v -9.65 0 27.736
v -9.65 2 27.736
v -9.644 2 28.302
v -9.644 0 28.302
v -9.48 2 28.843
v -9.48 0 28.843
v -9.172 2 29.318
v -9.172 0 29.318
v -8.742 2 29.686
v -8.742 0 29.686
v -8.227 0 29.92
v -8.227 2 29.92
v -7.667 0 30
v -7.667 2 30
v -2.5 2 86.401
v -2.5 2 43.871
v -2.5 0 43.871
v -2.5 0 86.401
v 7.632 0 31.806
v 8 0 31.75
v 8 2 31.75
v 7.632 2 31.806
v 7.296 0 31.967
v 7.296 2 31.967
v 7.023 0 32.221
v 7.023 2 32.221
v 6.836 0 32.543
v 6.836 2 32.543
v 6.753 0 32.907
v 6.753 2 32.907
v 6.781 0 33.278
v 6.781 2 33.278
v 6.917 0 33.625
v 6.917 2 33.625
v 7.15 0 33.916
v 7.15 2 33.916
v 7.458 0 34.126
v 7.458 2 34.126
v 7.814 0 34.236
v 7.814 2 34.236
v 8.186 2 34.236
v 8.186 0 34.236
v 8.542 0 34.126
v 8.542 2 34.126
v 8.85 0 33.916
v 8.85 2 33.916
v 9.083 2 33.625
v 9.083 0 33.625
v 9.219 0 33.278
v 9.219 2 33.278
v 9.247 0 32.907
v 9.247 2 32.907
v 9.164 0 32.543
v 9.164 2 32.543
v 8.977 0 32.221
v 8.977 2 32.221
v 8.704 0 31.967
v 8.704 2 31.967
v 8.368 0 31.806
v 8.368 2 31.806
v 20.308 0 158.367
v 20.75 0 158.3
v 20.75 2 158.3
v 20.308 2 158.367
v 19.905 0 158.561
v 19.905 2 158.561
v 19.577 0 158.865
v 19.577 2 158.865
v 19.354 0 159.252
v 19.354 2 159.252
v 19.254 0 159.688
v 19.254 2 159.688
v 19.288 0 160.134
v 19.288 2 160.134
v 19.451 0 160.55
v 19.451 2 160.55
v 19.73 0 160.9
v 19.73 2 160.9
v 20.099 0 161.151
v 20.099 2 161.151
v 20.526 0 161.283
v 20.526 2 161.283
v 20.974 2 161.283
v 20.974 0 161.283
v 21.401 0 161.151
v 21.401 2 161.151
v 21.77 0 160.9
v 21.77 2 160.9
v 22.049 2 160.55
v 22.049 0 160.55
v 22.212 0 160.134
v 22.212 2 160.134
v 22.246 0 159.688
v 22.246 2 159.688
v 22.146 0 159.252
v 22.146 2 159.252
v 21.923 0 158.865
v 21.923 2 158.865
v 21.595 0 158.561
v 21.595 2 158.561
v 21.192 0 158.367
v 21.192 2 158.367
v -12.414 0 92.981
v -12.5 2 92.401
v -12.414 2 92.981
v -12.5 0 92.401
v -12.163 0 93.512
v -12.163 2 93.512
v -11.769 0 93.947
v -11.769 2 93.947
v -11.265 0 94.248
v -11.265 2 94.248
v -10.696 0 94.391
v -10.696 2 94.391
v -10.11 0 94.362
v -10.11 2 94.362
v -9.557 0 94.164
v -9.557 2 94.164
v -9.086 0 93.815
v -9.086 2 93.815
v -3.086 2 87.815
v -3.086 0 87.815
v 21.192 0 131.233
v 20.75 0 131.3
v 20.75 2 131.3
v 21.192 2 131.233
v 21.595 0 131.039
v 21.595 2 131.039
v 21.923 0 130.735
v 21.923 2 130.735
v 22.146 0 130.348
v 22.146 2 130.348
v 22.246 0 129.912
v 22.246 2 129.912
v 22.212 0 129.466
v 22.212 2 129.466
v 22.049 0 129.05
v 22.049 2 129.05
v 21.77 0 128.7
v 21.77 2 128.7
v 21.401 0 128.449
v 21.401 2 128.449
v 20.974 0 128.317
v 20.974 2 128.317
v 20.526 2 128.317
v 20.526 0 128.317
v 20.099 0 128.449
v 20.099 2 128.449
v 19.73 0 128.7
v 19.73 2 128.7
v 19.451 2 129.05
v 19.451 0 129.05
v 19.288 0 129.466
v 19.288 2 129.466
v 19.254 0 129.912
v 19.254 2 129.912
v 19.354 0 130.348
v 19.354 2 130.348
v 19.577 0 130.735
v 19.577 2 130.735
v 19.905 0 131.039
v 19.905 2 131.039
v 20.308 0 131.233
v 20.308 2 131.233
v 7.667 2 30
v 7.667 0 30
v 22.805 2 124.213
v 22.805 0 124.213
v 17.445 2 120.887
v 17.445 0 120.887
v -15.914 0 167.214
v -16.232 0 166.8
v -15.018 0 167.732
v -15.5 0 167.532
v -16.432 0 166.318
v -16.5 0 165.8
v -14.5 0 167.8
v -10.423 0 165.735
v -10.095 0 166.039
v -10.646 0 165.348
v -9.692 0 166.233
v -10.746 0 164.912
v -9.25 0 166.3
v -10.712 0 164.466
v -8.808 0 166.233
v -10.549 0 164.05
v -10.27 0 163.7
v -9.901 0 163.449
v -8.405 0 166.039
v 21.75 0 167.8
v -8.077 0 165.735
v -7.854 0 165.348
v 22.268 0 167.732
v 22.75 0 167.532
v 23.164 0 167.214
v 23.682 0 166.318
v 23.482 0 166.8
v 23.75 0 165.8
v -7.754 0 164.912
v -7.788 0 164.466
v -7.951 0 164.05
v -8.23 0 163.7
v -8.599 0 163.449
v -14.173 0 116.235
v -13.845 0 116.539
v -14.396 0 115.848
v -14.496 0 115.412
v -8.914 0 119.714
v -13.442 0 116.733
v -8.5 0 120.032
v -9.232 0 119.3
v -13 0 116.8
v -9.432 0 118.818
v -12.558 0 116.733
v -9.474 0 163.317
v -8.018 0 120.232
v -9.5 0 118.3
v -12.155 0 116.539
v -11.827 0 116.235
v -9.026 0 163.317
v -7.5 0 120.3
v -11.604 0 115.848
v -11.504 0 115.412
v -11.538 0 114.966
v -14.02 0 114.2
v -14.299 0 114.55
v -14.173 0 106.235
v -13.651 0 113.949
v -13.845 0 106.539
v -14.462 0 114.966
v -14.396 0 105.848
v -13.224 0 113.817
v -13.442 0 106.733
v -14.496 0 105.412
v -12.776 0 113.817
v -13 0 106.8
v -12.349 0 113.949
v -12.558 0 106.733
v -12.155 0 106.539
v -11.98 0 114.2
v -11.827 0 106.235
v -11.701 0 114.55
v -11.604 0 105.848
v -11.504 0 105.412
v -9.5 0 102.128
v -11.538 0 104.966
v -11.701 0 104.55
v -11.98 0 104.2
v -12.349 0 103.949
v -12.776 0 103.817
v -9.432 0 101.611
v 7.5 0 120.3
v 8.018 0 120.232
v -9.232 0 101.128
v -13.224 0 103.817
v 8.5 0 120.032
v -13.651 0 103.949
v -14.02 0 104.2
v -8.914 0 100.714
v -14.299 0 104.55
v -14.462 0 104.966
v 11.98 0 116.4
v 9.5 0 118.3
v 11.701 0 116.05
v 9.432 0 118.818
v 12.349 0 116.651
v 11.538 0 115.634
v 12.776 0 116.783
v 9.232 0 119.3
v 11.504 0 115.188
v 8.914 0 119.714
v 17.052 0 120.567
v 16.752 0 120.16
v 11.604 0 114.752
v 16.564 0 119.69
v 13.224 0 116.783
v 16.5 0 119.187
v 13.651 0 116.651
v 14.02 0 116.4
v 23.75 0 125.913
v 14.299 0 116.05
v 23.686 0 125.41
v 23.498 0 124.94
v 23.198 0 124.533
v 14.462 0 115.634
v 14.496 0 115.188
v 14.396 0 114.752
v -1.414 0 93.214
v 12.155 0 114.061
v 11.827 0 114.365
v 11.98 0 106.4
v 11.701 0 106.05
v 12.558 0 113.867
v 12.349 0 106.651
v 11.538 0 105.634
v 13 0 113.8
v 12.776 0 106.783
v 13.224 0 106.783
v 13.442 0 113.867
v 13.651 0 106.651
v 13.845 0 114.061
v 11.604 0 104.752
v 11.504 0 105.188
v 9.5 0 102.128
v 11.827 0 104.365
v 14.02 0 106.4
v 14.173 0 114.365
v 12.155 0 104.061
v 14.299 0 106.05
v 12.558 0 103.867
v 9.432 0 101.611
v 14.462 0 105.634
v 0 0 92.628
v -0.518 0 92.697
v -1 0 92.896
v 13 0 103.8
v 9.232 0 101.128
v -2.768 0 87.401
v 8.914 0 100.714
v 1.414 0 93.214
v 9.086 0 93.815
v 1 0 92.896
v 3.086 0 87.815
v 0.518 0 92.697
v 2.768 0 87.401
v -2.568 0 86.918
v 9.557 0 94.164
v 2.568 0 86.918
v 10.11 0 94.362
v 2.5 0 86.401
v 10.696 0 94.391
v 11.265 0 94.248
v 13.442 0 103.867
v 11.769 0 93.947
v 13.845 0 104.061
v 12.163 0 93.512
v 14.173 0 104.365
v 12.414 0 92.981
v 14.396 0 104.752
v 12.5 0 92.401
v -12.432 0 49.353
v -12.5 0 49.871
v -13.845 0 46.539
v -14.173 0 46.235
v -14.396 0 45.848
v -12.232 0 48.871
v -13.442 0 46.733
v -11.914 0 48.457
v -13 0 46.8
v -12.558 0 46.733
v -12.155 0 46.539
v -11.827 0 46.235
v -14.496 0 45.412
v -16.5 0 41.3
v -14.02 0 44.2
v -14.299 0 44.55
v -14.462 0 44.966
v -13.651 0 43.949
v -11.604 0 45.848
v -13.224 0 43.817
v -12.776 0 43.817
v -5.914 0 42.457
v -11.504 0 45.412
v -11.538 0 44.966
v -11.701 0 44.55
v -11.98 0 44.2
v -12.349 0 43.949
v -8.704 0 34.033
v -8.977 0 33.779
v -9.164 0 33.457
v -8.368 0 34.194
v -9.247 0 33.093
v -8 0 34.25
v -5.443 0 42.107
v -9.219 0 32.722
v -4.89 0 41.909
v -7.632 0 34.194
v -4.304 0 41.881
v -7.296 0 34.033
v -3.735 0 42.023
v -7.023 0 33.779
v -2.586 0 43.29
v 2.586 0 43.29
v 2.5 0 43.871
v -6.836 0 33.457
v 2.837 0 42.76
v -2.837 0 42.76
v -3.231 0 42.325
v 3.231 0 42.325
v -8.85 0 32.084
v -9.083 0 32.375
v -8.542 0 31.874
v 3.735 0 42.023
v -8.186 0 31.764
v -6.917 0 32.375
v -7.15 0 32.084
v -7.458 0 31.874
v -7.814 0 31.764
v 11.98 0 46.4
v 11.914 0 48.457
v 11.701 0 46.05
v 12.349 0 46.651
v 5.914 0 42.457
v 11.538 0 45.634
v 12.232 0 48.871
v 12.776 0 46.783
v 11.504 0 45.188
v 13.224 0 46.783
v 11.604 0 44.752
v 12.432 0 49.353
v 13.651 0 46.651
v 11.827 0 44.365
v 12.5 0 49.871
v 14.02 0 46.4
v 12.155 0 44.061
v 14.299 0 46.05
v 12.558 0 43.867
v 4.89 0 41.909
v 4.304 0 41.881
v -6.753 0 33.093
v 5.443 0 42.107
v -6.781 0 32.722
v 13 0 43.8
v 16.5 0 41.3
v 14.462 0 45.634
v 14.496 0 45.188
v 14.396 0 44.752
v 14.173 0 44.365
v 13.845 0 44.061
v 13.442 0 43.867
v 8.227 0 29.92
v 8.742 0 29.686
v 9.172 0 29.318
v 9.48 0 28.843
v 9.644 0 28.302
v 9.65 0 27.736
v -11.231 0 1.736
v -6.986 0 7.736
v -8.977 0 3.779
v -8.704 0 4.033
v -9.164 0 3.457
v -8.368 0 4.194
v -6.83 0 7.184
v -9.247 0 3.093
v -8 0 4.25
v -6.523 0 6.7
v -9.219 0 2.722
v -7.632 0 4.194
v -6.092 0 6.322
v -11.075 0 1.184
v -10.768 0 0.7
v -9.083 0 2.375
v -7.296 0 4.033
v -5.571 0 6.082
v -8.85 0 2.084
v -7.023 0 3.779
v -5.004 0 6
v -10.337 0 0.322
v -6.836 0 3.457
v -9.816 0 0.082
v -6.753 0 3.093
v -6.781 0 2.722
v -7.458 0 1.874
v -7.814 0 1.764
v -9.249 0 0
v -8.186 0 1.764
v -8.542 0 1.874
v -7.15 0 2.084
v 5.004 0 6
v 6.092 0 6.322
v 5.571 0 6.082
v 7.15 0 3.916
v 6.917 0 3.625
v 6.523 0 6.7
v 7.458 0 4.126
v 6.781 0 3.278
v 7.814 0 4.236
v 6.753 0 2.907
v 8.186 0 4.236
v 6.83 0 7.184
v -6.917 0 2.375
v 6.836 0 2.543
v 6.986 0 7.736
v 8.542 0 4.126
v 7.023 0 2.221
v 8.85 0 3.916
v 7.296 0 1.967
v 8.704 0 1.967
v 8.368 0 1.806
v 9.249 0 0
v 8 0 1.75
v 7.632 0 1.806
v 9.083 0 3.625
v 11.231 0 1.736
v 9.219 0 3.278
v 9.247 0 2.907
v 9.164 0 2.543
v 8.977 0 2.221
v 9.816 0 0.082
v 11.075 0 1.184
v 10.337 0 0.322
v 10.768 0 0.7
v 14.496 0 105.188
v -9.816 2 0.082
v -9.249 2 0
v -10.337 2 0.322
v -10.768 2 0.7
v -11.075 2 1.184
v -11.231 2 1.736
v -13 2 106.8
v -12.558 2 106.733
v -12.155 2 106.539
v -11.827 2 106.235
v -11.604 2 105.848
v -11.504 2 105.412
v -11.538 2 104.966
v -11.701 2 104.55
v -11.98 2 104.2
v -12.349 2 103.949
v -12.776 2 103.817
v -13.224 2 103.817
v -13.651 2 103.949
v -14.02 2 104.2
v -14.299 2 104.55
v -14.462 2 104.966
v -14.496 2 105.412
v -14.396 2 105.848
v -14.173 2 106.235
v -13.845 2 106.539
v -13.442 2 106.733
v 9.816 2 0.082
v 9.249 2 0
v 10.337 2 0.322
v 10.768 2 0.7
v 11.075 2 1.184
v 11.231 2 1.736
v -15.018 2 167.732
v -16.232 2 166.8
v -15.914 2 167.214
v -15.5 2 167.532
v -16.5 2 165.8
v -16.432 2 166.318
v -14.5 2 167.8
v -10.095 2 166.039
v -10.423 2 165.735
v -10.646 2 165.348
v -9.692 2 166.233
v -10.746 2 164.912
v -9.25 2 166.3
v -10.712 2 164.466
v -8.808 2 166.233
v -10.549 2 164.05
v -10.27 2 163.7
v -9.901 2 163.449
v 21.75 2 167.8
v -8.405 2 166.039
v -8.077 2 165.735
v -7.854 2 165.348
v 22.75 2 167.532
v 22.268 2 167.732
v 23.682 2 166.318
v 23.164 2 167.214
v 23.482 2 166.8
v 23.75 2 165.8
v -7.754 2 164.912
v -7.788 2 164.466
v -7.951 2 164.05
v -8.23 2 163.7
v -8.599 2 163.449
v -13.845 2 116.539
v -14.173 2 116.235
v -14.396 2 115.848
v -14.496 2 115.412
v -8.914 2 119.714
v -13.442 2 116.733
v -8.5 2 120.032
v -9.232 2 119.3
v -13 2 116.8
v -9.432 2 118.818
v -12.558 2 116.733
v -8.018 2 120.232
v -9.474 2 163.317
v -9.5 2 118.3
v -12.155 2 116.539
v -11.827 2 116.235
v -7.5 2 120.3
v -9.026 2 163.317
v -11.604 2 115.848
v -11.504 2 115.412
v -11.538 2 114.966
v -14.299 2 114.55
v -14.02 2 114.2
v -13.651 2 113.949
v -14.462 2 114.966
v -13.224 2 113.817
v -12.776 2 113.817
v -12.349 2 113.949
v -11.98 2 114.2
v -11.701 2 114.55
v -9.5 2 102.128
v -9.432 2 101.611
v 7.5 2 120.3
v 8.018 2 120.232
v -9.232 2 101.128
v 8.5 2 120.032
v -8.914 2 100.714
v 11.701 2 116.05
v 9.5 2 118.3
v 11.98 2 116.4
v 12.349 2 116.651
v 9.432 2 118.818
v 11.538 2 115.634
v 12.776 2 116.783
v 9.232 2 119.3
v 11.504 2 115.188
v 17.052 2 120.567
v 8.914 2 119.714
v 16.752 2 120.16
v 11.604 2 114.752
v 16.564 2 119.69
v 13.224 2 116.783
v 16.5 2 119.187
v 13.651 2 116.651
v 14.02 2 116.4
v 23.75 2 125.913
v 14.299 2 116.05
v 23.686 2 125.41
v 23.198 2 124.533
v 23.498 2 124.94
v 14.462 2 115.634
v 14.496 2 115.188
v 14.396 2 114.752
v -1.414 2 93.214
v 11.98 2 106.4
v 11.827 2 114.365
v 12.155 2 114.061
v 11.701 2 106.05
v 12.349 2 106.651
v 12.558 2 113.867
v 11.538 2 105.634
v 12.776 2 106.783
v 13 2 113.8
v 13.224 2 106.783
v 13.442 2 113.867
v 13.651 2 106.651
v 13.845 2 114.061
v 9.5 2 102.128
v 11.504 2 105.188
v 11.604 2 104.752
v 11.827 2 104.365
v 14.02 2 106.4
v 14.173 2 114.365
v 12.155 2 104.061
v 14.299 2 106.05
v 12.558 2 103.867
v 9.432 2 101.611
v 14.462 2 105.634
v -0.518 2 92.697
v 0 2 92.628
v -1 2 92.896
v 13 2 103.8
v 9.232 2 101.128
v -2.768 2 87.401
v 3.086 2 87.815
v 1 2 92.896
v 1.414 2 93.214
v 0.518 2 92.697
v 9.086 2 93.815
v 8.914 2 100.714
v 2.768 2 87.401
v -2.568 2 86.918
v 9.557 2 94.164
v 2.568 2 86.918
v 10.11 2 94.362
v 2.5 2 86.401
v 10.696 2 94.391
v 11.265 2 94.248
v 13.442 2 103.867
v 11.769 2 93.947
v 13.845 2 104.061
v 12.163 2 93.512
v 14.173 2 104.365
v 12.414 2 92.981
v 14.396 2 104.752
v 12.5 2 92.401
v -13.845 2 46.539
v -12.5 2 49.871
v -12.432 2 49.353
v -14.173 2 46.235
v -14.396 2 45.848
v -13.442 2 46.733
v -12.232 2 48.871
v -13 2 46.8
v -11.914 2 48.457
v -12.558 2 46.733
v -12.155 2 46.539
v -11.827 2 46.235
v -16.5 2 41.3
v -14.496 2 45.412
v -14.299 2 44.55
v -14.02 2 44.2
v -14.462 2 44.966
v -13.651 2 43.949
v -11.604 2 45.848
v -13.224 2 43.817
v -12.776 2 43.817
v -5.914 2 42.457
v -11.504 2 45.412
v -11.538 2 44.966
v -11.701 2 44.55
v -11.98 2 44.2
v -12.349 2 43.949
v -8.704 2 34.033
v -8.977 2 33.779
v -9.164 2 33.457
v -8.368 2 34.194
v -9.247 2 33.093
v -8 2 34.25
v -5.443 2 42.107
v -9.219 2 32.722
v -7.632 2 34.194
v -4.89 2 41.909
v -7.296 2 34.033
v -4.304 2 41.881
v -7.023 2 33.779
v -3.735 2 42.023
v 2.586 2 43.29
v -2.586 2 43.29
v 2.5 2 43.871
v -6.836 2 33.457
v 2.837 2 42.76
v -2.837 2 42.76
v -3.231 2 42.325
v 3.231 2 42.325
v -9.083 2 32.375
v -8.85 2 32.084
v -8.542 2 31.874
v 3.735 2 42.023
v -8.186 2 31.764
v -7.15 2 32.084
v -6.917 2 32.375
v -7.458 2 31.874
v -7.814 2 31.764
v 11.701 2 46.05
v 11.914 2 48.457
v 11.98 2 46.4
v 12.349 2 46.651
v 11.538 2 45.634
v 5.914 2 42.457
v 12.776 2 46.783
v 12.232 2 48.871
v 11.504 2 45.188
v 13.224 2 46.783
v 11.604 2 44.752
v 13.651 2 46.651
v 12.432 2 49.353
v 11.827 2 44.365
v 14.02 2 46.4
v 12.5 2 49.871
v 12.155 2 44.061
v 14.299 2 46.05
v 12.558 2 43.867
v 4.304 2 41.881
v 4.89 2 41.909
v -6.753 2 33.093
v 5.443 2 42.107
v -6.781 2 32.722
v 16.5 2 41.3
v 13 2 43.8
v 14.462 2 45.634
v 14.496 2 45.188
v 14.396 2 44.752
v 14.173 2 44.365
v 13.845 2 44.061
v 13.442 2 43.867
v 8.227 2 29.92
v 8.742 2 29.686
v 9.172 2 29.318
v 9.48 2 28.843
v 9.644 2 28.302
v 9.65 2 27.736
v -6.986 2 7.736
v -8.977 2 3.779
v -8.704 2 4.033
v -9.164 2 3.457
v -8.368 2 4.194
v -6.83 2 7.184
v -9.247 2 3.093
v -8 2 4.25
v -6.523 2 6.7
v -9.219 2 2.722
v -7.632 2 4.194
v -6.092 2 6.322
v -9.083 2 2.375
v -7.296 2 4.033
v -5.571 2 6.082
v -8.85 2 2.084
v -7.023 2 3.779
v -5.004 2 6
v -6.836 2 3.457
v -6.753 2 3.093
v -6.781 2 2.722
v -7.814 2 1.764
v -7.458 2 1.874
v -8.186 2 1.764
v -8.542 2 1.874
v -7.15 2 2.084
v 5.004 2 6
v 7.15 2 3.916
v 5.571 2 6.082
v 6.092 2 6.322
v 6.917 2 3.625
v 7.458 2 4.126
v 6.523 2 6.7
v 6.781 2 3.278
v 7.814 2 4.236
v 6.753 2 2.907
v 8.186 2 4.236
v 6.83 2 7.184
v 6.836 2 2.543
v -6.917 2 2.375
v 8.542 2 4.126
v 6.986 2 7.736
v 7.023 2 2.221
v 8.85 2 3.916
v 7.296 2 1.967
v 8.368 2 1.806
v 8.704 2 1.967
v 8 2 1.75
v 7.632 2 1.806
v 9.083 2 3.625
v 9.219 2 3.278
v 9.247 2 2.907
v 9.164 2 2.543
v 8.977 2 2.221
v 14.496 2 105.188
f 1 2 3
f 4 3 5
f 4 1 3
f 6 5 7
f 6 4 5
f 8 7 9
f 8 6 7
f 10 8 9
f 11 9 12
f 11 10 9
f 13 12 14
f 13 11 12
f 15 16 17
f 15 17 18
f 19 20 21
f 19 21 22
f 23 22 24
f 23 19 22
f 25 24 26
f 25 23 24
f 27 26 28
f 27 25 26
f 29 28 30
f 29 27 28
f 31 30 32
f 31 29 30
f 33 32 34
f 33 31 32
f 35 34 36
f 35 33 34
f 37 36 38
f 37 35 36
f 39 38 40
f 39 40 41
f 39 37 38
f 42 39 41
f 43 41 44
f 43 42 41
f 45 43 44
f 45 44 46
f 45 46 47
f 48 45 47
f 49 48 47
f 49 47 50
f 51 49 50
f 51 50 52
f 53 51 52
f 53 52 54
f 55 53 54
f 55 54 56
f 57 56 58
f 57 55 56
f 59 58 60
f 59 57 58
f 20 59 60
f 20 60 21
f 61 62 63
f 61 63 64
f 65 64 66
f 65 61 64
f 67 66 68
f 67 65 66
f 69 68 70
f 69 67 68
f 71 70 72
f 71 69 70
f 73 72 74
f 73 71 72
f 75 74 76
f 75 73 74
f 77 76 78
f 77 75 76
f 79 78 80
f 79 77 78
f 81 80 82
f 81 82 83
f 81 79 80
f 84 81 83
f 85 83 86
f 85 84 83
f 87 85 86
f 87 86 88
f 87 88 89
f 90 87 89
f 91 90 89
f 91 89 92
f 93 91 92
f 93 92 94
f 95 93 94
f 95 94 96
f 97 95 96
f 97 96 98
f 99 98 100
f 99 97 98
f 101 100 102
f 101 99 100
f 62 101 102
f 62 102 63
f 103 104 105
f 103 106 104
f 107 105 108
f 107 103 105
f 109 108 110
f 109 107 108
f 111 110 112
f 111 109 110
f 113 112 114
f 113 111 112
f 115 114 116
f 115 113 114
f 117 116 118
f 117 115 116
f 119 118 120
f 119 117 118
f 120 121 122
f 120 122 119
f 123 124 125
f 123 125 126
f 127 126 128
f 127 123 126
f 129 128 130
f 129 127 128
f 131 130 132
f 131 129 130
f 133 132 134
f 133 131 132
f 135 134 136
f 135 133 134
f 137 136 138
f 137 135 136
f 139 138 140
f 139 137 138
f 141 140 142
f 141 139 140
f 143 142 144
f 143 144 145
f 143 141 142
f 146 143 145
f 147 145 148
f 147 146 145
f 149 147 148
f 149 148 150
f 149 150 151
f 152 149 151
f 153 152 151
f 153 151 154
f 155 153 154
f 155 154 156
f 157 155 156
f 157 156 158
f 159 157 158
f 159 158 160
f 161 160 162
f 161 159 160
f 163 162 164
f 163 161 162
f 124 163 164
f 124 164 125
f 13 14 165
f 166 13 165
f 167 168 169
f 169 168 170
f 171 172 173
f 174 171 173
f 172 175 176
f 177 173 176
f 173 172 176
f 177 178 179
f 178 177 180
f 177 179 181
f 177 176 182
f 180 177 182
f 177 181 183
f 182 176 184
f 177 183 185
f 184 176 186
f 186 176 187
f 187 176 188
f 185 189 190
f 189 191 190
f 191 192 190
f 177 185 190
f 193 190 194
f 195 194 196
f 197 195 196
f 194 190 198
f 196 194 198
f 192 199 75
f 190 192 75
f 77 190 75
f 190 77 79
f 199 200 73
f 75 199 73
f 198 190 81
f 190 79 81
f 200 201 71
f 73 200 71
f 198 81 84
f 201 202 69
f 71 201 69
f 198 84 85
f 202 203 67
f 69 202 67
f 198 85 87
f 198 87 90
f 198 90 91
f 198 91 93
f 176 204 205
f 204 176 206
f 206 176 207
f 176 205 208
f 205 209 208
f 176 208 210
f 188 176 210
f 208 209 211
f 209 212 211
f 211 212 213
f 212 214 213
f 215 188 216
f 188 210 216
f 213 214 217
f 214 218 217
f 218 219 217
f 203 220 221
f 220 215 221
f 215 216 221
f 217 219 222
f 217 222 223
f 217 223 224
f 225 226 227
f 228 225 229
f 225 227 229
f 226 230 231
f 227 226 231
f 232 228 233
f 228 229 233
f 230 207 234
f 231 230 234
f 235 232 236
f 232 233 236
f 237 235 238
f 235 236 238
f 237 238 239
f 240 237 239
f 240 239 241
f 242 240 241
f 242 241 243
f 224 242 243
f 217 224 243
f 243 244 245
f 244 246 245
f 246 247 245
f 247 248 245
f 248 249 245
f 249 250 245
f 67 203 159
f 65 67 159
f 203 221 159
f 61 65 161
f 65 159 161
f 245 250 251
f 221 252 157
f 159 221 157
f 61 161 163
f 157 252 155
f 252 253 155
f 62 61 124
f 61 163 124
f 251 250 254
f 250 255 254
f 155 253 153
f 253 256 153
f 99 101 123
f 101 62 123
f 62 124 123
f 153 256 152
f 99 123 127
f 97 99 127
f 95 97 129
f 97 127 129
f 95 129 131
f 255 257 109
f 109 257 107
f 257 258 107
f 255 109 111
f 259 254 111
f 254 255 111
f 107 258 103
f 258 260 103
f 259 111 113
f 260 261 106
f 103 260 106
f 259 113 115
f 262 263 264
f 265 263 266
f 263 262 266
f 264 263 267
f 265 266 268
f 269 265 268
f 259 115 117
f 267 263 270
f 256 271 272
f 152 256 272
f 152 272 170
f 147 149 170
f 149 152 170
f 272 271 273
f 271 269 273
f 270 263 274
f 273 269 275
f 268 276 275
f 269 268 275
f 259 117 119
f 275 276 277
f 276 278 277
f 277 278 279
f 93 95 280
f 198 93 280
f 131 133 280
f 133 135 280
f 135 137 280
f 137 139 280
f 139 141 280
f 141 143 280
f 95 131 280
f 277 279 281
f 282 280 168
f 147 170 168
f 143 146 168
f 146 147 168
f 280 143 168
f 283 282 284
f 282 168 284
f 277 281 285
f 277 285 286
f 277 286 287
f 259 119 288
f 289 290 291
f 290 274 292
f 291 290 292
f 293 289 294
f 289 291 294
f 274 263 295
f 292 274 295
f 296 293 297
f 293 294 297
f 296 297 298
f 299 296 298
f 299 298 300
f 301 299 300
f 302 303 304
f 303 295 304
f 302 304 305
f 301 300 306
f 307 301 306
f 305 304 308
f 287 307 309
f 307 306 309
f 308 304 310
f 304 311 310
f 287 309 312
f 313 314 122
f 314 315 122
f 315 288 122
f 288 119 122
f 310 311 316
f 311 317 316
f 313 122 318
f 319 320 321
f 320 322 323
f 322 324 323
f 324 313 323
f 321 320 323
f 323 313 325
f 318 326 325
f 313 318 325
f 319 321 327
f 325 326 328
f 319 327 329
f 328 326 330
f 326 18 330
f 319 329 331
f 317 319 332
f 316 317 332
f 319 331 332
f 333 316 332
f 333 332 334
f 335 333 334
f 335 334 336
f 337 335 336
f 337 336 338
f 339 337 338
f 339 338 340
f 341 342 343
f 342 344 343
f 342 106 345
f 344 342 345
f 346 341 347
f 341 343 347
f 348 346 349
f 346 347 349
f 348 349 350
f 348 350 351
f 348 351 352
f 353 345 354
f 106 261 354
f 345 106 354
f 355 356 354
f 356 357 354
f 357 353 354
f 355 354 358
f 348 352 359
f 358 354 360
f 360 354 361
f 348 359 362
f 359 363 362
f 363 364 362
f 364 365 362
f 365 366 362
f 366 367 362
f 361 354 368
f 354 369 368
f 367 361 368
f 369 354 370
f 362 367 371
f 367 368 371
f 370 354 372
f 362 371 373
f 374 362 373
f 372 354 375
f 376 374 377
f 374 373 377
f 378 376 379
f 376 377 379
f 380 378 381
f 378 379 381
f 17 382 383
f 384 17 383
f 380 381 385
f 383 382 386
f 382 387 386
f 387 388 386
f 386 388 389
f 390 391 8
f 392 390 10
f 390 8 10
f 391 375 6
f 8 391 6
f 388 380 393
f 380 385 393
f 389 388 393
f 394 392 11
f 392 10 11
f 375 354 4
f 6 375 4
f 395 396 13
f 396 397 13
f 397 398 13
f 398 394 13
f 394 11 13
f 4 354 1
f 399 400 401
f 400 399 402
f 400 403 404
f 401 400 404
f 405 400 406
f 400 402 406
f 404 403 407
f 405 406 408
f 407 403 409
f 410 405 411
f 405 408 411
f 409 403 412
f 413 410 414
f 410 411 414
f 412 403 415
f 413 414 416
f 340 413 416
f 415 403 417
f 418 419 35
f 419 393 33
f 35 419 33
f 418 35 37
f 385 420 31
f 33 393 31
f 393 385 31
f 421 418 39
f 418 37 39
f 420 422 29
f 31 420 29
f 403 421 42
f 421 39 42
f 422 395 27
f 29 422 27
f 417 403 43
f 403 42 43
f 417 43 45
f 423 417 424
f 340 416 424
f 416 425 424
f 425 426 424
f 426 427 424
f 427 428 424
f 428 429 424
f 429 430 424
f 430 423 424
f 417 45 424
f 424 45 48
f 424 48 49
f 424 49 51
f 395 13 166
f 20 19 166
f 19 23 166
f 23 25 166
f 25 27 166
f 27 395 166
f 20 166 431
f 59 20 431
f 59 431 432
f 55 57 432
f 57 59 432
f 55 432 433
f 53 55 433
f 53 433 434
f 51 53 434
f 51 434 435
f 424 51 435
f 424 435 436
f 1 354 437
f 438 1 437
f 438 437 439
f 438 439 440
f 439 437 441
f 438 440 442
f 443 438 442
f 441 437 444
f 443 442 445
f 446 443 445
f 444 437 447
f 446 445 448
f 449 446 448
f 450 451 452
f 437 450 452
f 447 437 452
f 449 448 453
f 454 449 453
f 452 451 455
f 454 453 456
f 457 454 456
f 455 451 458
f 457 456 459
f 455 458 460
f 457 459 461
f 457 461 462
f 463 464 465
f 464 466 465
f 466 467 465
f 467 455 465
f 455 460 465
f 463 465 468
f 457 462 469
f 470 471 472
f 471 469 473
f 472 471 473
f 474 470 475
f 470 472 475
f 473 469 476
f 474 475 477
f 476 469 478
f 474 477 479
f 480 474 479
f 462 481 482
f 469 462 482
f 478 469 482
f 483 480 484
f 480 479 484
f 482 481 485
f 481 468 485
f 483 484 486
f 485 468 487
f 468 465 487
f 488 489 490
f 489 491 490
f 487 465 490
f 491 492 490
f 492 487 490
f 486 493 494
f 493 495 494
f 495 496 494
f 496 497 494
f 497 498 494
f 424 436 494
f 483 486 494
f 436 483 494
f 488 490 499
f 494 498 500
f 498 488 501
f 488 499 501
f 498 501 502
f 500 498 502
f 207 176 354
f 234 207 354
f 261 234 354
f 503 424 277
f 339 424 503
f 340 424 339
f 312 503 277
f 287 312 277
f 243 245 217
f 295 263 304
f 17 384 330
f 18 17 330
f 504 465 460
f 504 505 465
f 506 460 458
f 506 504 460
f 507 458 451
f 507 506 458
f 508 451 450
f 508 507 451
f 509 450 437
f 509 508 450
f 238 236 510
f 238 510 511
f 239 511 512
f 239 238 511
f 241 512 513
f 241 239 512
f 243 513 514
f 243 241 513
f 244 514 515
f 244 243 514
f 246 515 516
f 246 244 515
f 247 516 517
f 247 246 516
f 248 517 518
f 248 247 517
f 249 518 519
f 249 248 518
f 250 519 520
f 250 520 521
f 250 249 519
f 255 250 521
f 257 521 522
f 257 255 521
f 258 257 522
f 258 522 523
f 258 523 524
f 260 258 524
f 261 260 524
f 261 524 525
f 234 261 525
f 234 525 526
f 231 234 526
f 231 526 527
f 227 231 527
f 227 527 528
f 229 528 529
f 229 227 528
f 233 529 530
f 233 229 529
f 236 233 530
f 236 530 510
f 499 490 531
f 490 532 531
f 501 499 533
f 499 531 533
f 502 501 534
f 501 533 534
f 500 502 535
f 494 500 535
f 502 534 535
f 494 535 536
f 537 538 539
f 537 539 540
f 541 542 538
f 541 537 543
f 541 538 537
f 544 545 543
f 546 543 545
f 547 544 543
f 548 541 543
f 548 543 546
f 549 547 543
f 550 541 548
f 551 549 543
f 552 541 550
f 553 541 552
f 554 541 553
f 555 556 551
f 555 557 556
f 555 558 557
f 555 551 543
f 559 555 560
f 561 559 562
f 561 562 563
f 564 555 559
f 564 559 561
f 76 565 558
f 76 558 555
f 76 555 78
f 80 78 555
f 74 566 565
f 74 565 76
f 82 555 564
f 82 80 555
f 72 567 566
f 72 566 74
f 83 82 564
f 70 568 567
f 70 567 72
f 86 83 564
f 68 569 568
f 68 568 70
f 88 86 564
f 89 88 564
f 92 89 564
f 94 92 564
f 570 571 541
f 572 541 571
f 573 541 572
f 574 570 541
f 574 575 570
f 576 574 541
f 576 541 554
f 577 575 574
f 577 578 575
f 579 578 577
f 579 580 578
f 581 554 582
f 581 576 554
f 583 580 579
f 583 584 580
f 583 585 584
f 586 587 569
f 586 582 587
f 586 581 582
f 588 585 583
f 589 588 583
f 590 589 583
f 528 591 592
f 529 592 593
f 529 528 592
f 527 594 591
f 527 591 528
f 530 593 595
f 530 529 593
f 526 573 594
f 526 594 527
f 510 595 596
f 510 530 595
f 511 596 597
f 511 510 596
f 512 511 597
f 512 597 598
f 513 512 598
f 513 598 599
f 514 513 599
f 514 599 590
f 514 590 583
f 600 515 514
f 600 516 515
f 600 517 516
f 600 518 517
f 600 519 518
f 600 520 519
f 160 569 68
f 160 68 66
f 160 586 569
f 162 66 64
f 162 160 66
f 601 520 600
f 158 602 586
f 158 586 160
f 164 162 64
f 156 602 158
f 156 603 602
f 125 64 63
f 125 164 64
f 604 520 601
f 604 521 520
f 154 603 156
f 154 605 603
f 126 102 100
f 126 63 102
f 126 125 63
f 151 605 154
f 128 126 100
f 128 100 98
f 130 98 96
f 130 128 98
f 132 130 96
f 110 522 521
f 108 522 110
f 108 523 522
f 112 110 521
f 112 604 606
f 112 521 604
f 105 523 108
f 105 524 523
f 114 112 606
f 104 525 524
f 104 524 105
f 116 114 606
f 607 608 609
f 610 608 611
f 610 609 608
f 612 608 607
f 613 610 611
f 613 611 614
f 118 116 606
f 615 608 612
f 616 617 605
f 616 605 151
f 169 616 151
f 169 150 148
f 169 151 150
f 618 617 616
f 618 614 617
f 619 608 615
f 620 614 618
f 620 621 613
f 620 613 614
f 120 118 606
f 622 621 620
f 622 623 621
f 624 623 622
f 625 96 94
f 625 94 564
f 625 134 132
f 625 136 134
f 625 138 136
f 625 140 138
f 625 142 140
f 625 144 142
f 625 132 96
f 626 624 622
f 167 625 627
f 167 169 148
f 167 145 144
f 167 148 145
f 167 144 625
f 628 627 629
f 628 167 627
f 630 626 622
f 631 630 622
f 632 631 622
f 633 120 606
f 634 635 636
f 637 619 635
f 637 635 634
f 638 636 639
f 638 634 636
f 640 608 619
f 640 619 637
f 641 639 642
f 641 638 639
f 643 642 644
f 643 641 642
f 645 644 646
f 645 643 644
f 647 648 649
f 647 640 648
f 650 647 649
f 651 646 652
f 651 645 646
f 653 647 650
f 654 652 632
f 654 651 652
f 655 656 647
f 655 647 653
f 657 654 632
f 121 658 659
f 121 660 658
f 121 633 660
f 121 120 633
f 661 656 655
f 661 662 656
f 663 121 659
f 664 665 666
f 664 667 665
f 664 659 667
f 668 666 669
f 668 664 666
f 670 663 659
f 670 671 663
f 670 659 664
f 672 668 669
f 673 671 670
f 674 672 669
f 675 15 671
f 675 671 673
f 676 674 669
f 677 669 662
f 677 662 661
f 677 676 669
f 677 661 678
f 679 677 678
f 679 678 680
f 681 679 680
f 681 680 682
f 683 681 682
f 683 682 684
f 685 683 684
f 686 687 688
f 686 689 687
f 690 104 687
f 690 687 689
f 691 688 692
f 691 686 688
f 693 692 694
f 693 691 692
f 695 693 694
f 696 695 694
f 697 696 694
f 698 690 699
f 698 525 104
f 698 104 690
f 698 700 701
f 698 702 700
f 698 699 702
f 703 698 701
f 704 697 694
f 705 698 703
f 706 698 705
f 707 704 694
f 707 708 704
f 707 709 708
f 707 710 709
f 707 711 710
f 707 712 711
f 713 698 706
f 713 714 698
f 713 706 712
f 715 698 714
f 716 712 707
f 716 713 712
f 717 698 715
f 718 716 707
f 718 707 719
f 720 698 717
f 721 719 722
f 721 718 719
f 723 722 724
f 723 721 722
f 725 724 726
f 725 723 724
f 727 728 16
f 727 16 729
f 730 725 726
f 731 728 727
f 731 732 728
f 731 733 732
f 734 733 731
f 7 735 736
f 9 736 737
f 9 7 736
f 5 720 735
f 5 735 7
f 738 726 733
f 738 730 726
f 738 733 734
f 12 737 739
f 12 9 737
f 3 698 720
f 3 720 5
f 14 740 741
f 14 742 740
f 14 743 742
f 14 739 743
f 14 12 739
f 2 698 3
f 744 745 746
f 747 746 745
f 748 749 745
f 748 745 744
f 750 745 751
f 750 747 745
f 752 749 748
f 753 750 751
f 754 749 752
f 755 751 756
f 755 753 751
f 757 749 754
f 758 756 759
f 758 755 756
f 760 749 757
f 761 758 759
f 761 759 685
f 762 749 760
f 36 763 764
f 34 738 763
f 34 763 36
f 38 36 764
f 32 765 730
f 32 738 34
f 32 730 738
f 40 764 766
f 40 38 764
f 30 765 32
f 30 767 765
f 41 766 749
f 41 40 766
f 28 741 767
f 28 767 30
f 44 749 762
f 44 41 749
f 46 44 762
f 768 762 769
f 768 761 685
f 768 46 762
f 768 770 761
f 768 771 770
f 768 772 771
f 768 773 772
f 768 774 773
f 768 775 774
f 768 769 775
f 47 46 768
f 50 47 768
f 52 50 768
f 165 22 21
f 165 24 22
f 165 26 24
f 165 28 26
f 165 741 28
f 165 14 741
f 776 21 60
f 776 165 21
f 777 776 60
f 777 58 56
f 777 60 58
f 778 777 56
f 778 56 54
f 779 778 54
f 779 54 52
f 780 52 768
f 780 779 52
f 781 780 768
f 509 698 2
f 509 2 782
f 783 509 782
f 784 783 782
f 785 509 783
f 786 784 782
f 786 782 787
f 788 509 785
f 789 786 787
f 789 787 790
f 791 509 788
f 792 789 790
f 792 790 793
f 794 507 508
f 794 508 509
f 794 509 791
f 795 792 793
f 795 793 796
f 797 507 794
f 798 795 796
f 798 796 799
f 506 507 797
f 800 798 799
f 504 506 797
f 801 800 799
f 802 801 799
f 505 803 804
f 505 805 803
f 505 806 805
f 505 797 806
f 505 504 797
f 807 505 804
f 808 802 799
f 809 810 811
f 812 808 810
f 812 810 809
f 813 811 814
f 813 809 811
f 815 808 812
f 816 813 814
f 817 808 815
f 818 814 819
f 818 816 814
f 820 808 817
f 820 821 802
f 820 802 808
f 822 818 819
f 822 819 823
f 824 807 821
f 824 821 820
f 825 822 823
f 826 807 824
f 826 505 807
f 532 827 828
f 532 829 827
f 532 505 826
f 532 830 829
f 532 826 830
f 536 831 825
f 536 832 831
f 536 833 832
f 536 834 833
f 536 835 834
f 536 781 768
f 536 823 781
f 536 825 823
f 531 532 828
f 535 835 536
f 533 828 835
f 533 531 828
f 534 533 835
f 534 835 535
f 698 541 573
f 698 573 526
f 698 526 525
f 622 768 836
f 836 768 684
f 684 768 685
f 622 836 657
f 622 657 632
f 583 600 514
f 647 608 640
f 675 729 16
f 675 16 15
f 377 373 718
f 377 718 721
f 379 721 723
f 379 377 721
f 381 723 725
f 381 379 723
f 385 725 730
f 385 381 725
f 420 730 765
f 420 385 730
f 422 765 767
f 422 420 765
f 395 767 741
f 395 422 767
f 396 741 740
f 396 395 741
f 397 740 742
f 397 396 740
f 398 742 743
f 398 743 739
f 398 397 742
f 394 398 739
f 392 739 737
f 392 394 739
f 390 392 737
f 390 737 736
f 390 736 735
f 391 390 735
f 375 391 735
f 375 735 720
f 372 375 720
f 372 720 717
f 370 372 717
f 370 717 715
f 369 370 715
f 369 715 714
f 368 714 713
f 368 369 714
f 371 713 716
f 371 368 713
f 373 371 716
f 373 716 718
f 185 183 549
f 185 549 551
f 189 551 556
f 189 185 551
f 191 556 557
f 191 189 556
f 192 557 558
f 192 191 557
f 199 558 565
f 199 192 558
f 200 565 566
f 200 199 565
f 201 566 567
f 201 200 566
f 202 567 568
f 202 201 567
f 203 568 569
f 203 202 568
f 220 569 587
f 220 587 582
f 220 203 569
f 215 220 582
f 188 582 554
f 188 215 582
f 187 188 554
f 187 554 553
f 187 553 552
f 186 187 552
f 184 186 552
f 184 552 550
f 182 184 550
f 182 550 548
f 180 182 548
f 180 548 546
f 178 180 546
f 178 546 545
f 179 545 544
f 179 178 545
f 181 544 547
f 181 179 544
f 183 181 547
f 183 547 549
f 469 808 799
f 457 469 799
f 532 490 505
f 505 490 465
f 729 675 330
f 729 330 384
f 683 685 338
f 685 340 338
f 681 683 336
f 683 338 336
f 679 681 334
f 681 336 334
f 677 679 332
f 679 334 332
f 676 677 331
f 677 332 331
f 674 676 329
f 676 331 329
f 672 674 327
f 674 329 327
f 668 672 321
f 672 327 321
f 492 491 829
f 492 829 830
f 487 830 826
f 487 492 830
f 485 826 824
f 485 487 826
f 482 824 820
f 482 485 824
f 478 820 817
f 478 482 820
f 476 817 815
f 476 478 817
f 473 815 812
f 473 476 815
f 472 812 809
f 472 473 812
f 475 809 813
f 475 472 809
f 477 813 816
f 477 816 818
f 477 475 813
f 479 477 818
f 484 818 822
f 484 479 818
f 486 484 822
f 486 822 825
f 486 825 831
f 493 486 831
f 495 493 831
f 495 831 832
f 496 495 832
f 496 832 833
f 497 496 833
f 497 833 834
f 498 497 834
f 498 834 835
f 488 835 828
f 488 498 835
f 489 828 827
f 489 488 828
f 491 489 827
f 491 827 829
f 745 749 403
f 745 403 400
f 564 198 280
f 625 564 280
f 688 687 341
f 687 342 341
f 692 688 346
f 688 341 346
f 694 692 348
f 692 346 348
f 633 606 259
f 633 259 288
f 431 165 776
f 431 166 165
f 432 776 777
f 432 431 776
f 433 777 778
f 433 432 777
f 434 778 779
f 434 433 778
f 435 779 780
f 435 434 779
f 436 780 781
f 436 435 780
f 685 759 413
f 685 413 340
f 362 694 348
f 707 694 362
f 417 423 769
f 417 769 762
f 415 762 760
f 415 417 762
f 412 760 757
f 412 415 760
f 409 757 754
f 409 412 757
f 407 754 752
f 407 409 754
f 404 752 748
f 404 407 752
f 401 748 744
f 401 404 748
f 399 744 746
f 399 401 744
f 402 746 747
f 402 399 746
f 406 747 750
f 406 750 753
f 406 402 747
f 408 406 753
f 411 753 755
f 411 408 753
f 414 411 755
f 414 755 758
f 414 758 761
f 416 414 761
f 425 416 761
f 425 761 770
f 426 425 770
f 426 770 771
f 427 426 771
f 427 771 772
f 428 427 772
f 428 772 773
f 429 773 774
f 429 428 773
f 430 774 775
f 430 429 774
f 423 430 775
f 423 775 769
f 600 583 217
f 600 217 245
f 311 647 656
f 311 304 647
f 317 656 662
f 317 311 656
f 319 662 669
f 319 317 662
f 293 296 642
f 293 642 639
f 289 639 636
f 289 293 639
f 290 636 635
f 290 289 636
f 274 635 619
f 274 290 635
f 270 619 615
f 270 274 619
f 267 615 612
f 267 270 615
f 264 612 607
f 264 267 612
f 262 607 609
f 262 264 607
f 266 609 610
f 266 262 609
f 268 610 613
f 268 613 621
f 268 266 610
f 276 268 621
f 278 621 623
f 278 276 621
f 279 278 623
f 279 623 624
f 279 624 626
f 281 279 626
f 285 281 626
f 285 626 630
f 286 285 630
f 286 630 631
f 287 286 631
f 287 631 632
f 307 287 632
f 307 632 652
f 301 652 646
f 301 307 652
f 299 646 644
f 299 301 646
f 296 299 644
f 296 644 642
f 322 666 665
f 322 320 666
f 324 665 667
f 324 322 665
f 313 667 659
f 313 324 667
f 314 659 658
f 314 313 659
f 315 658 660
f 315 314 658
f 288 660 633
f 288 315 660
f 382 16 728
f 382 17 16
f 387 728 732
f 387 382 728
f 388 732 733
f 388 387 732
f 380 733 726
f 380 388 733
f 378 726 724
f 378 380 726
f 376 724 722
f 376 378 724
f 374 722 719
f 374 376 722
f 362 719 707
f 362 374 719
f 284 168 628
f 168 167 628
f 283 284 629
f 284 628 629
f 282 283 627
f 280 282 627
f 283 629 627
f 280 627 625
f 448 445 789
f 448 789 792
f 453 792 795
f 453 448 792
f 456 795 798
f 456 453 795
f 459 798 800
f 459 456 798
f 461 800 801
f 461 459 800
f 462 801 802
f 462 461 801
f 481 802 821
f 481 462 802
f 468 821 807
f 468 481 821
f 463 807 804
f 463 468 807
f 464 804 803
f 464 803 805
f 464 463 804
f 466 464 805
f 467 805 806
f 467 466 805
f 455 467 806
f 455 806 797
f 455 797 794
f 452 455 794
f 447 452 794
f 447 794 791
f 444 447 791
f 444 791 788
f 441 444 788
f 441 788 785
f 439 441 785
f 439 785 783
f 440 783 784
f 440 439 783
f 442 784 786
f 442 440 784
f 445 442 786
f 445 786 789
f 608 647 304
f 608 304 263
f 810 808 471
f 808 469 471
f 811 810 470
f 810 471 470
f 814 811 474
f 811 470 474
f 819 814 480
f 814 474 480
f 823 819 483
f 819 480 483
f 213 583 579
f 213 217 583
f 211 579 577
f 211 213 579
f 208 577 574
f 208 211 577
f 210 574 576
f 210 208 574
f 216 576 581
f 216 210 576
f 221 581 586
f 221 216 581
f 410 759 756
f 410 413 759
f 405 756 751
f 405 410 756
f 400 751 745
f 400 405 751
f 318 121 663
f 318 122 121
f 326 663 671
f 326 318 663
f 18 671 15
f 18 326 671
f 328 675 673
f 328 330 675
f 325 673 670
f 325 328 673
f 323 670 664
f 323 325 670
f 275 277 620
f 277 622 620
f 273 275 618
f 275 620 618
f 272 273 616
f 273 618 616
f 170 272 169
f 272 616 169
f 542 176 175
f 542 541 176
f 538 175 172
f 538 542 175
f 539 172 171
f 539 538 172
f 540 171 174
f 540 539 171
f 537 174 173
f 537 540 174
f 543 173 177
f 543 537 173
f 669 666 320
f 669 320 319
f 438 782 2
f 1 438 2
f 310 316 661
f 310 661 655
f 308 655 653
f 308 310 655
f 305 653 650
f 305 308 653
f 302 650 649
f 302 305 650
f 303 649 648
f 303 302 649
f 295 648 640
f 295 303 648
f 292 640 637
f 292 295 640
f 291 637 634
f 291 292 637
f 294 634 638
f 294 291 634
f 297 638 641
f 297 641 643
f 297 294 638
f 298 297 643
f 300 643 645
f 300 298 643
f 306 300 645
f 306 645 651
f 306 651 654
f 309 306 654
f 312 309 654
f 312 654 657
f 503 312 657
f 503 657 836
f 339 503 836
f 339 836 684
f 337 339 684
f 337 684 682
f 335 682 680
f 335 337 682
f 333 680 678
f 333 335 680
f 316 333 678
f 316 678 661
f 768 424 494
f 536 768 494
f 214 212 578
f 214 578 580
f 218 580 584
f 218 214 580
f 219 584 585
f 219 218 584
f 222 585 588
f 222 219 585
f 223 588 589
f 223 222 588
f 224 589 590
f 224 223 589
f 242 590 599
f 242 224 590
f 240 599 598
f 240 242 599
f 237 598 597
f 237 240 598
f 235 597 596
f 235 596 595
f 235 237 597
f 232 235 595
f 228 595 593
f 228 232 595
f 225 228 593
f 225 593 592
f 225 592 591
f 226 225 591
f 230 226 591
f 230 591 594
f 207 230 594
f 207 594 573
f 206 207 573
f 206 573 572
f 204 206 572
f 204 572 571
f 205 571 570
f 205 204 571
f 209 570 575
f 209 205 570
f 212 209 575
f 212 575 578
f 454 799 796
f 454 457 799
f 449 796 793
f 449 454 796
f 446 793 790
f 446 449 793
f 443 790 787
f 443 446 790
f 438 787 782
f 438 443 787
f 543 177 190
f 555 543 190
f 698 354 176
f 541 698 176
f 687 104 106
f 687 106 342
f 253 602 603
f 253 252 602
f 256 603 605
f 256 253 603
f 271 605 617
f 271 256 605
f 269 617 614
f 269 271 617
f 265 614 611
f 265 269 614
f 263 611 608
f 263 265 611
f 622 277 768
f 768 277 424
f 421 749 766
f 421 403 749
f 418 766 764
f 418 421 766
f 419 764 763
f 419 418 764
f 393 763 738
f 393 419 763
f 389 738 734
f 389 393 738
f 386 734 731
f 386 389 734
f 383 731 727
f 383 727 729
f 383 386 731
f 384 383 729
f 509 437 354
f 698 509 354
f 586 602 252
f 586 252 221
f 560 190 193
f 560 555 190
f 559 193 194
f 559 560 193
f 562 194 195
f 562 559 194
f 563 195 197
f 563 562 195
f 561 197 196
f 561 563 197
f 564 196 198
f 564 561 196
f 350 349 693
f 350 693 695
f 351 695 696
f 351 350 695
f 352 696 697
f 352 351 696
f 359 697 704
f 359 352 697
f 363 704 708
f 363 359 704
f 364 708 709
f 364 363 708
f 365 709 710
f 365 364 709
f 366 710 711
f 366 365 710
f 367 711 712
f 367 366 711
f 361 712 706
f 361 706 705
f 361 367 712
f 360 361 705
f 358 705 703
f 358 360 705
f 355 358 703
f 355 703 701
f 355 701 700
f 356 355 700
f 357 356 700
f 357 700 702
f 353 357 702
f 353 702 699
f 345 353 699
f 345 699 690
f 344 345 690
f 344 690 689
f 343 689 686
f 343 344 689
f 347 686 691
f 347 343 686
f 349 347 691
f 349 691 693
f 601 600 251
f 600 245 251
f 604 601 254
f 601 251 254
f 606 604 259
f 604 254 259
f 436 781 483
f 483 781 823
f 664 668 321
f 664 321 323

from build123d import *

# Parameters (mm, degrees)
SKETCH_1_R          = 1.25
SKETCH_1_R_2        = 1.5
EXTRUDE_1_DEPTH     = 2
CUT_EXTRUDE_1_DEPTH = 10
FILLET_1_R          = 2


with BuildPart() as part:
    # 草图1 → 凸台-拉伸1 (new body)
    with BuildSketch(Plane(origin=(0, 0, 0), x_dir=(1, 0, 0), z_dir=(0, 1, 0))):
        Polygon((11, 0), (-11, 0), (-16.5, -41.3), (-16.5, -120.3), (-16.5, -167.8), (23.75, -167.8), (23.75, -124.8), (16.5, -120.3), (16.5, -41.3), align=None)
        with Locations(Location((-8, -3, 0), (0, 0, 270))):
            Circle(SKETCH_1_R, mode=Mode.SUBTRACT)
        with Locations(Location((-8, -33, 0), (0, 0, 270))):
            Circle(SKETCH_1_R, mode=Mode.SUBTRACT)
        with Locations(Location((8, -33, 0), (0, 0, 90))):
            Circle(SKETCH_1_R, mode=Mode.SUBTRACT)
        with Locations(Location((8, -3, 0), (0, 0, 90))):
            Circle(SKETCH_1_R, mode=Mode.SUBTRACT)
        with Locations(Location((-13, -45.3, 0), (0, 0, 270))):
            Circle(SKETCH_1_R_2, mode=Mode.SUBTRACT)
        with Locations(Location((-13, -105.3, 0), (0, 0, 270))):
            Circle(SKETCH_1_R_2, mode=Mode.SUBTRACT)
        with Locations(Location((-13, -115.3, 0), (0, 0, 270))):
            Circle(SKETCH_1_R_2, mode=Mode.SUBTRACT)
        with Locations(Location((13, -115.3, 0), (0, 0, 90))):
            Circle(SKETCH_1_R_2, mode=Mode.SUBTRACT)
        with Locations(Location((13, -105.3, 0), (0, 0, 90))):
            Circle(SKETCH_1_R_2, mode=Mode.SUBTRACT)
        with Locations(Location((13, -45.3, 0), (0, 0, 90))):
            Circle(SKETCH_1_R_2, mode=Mode.SUBTRACT)
        with Locations(Location((20.75, -129.8, 0), (0, 0, 270))):
            Circle(SKETCH_1_R_2, mode=Mode.SUBTRACT)
        with Locations(Location((20.75, -159.8, 0), (0, 0, 90))):
            Circle(SKETCH_1_R_2, mode=Mode.SUBTRACT)
        with Locations(Location((-9.25, -164.8, 0), (0, 0, 270))):
            Circle(SKETCH_1_R_2, mode=Mode.SUBTRACT)
    extrude(amount=EXTRUDE_1_DEPTH)

    # 草图2 → 切除-拉伸1 (cut)
    with BuildSketch(Plane(origin=(0, 2, 0), x_dir=(1, 0, 0), z_dir=(0, 1, 0))):
        Polygon((6.754889433, -6), (-6.754889433, -6), (-9.951015341, -30), (9.951015341, -30), align=None)
        Polygon((12.5, -97.228932188), (2.5, -87.228932188), (2.5, -39.042640687), (12.5, -49.042640687), align=None)
        Polygon((-12.5, -49.042640687), (-2.5, -39.042640687), (-2.5, -87.228932188), (-12.5, -97.228932188), align=None)
        Polygon((-9.5, -101.3), (0, -91.8), (9.5, -101.3), (9.5, -120.3), (-9.5, -120.3), align=None)
    extrude(amount=-CUT_EXTRUDE_1_DEPTH, mode=Mode.SUBTRACT)

    # 圆角1
    fillet_1_edges = [part.edges().sort_by_distance(p)[0] for p in [
        (-9.951015341, 1, 30),
        (-6.754889433, 1, 6),
        (6.754889433, 1, 6),
        (9.951015341, 1, 30),
        (0, 1, 91.8),
        (9.5, 1, 101.3),
        (9.5, 1, 120.3),
        (-9.5, 1, 120.3),
        (-9.5, 1, 101.3),
        (12.5, 1, 49.042640687),
        (12.5, 1, 97.228932188),
        (2.5, 1, 87.228932188),
        (2.5, 1, 39.042640687),
        (-12.5, 1, 97.228932188),
        (-12.5, 1, 49.042640687),
        (-2.5, 1, 39.042640687),
        (-2.5, 1, 87.228932188),
        (23.75, 1, 124.8),
        (23.75, 1, 167.8),
        (-16.5, 1, 167.8),
        (-11, 1, 0),
        (11, 1, 0),
        (16.5, 1, 120.3),
    ]]
    fillet(fillet_1_edges, radius=FILLET_1_R)


solid = part.part
